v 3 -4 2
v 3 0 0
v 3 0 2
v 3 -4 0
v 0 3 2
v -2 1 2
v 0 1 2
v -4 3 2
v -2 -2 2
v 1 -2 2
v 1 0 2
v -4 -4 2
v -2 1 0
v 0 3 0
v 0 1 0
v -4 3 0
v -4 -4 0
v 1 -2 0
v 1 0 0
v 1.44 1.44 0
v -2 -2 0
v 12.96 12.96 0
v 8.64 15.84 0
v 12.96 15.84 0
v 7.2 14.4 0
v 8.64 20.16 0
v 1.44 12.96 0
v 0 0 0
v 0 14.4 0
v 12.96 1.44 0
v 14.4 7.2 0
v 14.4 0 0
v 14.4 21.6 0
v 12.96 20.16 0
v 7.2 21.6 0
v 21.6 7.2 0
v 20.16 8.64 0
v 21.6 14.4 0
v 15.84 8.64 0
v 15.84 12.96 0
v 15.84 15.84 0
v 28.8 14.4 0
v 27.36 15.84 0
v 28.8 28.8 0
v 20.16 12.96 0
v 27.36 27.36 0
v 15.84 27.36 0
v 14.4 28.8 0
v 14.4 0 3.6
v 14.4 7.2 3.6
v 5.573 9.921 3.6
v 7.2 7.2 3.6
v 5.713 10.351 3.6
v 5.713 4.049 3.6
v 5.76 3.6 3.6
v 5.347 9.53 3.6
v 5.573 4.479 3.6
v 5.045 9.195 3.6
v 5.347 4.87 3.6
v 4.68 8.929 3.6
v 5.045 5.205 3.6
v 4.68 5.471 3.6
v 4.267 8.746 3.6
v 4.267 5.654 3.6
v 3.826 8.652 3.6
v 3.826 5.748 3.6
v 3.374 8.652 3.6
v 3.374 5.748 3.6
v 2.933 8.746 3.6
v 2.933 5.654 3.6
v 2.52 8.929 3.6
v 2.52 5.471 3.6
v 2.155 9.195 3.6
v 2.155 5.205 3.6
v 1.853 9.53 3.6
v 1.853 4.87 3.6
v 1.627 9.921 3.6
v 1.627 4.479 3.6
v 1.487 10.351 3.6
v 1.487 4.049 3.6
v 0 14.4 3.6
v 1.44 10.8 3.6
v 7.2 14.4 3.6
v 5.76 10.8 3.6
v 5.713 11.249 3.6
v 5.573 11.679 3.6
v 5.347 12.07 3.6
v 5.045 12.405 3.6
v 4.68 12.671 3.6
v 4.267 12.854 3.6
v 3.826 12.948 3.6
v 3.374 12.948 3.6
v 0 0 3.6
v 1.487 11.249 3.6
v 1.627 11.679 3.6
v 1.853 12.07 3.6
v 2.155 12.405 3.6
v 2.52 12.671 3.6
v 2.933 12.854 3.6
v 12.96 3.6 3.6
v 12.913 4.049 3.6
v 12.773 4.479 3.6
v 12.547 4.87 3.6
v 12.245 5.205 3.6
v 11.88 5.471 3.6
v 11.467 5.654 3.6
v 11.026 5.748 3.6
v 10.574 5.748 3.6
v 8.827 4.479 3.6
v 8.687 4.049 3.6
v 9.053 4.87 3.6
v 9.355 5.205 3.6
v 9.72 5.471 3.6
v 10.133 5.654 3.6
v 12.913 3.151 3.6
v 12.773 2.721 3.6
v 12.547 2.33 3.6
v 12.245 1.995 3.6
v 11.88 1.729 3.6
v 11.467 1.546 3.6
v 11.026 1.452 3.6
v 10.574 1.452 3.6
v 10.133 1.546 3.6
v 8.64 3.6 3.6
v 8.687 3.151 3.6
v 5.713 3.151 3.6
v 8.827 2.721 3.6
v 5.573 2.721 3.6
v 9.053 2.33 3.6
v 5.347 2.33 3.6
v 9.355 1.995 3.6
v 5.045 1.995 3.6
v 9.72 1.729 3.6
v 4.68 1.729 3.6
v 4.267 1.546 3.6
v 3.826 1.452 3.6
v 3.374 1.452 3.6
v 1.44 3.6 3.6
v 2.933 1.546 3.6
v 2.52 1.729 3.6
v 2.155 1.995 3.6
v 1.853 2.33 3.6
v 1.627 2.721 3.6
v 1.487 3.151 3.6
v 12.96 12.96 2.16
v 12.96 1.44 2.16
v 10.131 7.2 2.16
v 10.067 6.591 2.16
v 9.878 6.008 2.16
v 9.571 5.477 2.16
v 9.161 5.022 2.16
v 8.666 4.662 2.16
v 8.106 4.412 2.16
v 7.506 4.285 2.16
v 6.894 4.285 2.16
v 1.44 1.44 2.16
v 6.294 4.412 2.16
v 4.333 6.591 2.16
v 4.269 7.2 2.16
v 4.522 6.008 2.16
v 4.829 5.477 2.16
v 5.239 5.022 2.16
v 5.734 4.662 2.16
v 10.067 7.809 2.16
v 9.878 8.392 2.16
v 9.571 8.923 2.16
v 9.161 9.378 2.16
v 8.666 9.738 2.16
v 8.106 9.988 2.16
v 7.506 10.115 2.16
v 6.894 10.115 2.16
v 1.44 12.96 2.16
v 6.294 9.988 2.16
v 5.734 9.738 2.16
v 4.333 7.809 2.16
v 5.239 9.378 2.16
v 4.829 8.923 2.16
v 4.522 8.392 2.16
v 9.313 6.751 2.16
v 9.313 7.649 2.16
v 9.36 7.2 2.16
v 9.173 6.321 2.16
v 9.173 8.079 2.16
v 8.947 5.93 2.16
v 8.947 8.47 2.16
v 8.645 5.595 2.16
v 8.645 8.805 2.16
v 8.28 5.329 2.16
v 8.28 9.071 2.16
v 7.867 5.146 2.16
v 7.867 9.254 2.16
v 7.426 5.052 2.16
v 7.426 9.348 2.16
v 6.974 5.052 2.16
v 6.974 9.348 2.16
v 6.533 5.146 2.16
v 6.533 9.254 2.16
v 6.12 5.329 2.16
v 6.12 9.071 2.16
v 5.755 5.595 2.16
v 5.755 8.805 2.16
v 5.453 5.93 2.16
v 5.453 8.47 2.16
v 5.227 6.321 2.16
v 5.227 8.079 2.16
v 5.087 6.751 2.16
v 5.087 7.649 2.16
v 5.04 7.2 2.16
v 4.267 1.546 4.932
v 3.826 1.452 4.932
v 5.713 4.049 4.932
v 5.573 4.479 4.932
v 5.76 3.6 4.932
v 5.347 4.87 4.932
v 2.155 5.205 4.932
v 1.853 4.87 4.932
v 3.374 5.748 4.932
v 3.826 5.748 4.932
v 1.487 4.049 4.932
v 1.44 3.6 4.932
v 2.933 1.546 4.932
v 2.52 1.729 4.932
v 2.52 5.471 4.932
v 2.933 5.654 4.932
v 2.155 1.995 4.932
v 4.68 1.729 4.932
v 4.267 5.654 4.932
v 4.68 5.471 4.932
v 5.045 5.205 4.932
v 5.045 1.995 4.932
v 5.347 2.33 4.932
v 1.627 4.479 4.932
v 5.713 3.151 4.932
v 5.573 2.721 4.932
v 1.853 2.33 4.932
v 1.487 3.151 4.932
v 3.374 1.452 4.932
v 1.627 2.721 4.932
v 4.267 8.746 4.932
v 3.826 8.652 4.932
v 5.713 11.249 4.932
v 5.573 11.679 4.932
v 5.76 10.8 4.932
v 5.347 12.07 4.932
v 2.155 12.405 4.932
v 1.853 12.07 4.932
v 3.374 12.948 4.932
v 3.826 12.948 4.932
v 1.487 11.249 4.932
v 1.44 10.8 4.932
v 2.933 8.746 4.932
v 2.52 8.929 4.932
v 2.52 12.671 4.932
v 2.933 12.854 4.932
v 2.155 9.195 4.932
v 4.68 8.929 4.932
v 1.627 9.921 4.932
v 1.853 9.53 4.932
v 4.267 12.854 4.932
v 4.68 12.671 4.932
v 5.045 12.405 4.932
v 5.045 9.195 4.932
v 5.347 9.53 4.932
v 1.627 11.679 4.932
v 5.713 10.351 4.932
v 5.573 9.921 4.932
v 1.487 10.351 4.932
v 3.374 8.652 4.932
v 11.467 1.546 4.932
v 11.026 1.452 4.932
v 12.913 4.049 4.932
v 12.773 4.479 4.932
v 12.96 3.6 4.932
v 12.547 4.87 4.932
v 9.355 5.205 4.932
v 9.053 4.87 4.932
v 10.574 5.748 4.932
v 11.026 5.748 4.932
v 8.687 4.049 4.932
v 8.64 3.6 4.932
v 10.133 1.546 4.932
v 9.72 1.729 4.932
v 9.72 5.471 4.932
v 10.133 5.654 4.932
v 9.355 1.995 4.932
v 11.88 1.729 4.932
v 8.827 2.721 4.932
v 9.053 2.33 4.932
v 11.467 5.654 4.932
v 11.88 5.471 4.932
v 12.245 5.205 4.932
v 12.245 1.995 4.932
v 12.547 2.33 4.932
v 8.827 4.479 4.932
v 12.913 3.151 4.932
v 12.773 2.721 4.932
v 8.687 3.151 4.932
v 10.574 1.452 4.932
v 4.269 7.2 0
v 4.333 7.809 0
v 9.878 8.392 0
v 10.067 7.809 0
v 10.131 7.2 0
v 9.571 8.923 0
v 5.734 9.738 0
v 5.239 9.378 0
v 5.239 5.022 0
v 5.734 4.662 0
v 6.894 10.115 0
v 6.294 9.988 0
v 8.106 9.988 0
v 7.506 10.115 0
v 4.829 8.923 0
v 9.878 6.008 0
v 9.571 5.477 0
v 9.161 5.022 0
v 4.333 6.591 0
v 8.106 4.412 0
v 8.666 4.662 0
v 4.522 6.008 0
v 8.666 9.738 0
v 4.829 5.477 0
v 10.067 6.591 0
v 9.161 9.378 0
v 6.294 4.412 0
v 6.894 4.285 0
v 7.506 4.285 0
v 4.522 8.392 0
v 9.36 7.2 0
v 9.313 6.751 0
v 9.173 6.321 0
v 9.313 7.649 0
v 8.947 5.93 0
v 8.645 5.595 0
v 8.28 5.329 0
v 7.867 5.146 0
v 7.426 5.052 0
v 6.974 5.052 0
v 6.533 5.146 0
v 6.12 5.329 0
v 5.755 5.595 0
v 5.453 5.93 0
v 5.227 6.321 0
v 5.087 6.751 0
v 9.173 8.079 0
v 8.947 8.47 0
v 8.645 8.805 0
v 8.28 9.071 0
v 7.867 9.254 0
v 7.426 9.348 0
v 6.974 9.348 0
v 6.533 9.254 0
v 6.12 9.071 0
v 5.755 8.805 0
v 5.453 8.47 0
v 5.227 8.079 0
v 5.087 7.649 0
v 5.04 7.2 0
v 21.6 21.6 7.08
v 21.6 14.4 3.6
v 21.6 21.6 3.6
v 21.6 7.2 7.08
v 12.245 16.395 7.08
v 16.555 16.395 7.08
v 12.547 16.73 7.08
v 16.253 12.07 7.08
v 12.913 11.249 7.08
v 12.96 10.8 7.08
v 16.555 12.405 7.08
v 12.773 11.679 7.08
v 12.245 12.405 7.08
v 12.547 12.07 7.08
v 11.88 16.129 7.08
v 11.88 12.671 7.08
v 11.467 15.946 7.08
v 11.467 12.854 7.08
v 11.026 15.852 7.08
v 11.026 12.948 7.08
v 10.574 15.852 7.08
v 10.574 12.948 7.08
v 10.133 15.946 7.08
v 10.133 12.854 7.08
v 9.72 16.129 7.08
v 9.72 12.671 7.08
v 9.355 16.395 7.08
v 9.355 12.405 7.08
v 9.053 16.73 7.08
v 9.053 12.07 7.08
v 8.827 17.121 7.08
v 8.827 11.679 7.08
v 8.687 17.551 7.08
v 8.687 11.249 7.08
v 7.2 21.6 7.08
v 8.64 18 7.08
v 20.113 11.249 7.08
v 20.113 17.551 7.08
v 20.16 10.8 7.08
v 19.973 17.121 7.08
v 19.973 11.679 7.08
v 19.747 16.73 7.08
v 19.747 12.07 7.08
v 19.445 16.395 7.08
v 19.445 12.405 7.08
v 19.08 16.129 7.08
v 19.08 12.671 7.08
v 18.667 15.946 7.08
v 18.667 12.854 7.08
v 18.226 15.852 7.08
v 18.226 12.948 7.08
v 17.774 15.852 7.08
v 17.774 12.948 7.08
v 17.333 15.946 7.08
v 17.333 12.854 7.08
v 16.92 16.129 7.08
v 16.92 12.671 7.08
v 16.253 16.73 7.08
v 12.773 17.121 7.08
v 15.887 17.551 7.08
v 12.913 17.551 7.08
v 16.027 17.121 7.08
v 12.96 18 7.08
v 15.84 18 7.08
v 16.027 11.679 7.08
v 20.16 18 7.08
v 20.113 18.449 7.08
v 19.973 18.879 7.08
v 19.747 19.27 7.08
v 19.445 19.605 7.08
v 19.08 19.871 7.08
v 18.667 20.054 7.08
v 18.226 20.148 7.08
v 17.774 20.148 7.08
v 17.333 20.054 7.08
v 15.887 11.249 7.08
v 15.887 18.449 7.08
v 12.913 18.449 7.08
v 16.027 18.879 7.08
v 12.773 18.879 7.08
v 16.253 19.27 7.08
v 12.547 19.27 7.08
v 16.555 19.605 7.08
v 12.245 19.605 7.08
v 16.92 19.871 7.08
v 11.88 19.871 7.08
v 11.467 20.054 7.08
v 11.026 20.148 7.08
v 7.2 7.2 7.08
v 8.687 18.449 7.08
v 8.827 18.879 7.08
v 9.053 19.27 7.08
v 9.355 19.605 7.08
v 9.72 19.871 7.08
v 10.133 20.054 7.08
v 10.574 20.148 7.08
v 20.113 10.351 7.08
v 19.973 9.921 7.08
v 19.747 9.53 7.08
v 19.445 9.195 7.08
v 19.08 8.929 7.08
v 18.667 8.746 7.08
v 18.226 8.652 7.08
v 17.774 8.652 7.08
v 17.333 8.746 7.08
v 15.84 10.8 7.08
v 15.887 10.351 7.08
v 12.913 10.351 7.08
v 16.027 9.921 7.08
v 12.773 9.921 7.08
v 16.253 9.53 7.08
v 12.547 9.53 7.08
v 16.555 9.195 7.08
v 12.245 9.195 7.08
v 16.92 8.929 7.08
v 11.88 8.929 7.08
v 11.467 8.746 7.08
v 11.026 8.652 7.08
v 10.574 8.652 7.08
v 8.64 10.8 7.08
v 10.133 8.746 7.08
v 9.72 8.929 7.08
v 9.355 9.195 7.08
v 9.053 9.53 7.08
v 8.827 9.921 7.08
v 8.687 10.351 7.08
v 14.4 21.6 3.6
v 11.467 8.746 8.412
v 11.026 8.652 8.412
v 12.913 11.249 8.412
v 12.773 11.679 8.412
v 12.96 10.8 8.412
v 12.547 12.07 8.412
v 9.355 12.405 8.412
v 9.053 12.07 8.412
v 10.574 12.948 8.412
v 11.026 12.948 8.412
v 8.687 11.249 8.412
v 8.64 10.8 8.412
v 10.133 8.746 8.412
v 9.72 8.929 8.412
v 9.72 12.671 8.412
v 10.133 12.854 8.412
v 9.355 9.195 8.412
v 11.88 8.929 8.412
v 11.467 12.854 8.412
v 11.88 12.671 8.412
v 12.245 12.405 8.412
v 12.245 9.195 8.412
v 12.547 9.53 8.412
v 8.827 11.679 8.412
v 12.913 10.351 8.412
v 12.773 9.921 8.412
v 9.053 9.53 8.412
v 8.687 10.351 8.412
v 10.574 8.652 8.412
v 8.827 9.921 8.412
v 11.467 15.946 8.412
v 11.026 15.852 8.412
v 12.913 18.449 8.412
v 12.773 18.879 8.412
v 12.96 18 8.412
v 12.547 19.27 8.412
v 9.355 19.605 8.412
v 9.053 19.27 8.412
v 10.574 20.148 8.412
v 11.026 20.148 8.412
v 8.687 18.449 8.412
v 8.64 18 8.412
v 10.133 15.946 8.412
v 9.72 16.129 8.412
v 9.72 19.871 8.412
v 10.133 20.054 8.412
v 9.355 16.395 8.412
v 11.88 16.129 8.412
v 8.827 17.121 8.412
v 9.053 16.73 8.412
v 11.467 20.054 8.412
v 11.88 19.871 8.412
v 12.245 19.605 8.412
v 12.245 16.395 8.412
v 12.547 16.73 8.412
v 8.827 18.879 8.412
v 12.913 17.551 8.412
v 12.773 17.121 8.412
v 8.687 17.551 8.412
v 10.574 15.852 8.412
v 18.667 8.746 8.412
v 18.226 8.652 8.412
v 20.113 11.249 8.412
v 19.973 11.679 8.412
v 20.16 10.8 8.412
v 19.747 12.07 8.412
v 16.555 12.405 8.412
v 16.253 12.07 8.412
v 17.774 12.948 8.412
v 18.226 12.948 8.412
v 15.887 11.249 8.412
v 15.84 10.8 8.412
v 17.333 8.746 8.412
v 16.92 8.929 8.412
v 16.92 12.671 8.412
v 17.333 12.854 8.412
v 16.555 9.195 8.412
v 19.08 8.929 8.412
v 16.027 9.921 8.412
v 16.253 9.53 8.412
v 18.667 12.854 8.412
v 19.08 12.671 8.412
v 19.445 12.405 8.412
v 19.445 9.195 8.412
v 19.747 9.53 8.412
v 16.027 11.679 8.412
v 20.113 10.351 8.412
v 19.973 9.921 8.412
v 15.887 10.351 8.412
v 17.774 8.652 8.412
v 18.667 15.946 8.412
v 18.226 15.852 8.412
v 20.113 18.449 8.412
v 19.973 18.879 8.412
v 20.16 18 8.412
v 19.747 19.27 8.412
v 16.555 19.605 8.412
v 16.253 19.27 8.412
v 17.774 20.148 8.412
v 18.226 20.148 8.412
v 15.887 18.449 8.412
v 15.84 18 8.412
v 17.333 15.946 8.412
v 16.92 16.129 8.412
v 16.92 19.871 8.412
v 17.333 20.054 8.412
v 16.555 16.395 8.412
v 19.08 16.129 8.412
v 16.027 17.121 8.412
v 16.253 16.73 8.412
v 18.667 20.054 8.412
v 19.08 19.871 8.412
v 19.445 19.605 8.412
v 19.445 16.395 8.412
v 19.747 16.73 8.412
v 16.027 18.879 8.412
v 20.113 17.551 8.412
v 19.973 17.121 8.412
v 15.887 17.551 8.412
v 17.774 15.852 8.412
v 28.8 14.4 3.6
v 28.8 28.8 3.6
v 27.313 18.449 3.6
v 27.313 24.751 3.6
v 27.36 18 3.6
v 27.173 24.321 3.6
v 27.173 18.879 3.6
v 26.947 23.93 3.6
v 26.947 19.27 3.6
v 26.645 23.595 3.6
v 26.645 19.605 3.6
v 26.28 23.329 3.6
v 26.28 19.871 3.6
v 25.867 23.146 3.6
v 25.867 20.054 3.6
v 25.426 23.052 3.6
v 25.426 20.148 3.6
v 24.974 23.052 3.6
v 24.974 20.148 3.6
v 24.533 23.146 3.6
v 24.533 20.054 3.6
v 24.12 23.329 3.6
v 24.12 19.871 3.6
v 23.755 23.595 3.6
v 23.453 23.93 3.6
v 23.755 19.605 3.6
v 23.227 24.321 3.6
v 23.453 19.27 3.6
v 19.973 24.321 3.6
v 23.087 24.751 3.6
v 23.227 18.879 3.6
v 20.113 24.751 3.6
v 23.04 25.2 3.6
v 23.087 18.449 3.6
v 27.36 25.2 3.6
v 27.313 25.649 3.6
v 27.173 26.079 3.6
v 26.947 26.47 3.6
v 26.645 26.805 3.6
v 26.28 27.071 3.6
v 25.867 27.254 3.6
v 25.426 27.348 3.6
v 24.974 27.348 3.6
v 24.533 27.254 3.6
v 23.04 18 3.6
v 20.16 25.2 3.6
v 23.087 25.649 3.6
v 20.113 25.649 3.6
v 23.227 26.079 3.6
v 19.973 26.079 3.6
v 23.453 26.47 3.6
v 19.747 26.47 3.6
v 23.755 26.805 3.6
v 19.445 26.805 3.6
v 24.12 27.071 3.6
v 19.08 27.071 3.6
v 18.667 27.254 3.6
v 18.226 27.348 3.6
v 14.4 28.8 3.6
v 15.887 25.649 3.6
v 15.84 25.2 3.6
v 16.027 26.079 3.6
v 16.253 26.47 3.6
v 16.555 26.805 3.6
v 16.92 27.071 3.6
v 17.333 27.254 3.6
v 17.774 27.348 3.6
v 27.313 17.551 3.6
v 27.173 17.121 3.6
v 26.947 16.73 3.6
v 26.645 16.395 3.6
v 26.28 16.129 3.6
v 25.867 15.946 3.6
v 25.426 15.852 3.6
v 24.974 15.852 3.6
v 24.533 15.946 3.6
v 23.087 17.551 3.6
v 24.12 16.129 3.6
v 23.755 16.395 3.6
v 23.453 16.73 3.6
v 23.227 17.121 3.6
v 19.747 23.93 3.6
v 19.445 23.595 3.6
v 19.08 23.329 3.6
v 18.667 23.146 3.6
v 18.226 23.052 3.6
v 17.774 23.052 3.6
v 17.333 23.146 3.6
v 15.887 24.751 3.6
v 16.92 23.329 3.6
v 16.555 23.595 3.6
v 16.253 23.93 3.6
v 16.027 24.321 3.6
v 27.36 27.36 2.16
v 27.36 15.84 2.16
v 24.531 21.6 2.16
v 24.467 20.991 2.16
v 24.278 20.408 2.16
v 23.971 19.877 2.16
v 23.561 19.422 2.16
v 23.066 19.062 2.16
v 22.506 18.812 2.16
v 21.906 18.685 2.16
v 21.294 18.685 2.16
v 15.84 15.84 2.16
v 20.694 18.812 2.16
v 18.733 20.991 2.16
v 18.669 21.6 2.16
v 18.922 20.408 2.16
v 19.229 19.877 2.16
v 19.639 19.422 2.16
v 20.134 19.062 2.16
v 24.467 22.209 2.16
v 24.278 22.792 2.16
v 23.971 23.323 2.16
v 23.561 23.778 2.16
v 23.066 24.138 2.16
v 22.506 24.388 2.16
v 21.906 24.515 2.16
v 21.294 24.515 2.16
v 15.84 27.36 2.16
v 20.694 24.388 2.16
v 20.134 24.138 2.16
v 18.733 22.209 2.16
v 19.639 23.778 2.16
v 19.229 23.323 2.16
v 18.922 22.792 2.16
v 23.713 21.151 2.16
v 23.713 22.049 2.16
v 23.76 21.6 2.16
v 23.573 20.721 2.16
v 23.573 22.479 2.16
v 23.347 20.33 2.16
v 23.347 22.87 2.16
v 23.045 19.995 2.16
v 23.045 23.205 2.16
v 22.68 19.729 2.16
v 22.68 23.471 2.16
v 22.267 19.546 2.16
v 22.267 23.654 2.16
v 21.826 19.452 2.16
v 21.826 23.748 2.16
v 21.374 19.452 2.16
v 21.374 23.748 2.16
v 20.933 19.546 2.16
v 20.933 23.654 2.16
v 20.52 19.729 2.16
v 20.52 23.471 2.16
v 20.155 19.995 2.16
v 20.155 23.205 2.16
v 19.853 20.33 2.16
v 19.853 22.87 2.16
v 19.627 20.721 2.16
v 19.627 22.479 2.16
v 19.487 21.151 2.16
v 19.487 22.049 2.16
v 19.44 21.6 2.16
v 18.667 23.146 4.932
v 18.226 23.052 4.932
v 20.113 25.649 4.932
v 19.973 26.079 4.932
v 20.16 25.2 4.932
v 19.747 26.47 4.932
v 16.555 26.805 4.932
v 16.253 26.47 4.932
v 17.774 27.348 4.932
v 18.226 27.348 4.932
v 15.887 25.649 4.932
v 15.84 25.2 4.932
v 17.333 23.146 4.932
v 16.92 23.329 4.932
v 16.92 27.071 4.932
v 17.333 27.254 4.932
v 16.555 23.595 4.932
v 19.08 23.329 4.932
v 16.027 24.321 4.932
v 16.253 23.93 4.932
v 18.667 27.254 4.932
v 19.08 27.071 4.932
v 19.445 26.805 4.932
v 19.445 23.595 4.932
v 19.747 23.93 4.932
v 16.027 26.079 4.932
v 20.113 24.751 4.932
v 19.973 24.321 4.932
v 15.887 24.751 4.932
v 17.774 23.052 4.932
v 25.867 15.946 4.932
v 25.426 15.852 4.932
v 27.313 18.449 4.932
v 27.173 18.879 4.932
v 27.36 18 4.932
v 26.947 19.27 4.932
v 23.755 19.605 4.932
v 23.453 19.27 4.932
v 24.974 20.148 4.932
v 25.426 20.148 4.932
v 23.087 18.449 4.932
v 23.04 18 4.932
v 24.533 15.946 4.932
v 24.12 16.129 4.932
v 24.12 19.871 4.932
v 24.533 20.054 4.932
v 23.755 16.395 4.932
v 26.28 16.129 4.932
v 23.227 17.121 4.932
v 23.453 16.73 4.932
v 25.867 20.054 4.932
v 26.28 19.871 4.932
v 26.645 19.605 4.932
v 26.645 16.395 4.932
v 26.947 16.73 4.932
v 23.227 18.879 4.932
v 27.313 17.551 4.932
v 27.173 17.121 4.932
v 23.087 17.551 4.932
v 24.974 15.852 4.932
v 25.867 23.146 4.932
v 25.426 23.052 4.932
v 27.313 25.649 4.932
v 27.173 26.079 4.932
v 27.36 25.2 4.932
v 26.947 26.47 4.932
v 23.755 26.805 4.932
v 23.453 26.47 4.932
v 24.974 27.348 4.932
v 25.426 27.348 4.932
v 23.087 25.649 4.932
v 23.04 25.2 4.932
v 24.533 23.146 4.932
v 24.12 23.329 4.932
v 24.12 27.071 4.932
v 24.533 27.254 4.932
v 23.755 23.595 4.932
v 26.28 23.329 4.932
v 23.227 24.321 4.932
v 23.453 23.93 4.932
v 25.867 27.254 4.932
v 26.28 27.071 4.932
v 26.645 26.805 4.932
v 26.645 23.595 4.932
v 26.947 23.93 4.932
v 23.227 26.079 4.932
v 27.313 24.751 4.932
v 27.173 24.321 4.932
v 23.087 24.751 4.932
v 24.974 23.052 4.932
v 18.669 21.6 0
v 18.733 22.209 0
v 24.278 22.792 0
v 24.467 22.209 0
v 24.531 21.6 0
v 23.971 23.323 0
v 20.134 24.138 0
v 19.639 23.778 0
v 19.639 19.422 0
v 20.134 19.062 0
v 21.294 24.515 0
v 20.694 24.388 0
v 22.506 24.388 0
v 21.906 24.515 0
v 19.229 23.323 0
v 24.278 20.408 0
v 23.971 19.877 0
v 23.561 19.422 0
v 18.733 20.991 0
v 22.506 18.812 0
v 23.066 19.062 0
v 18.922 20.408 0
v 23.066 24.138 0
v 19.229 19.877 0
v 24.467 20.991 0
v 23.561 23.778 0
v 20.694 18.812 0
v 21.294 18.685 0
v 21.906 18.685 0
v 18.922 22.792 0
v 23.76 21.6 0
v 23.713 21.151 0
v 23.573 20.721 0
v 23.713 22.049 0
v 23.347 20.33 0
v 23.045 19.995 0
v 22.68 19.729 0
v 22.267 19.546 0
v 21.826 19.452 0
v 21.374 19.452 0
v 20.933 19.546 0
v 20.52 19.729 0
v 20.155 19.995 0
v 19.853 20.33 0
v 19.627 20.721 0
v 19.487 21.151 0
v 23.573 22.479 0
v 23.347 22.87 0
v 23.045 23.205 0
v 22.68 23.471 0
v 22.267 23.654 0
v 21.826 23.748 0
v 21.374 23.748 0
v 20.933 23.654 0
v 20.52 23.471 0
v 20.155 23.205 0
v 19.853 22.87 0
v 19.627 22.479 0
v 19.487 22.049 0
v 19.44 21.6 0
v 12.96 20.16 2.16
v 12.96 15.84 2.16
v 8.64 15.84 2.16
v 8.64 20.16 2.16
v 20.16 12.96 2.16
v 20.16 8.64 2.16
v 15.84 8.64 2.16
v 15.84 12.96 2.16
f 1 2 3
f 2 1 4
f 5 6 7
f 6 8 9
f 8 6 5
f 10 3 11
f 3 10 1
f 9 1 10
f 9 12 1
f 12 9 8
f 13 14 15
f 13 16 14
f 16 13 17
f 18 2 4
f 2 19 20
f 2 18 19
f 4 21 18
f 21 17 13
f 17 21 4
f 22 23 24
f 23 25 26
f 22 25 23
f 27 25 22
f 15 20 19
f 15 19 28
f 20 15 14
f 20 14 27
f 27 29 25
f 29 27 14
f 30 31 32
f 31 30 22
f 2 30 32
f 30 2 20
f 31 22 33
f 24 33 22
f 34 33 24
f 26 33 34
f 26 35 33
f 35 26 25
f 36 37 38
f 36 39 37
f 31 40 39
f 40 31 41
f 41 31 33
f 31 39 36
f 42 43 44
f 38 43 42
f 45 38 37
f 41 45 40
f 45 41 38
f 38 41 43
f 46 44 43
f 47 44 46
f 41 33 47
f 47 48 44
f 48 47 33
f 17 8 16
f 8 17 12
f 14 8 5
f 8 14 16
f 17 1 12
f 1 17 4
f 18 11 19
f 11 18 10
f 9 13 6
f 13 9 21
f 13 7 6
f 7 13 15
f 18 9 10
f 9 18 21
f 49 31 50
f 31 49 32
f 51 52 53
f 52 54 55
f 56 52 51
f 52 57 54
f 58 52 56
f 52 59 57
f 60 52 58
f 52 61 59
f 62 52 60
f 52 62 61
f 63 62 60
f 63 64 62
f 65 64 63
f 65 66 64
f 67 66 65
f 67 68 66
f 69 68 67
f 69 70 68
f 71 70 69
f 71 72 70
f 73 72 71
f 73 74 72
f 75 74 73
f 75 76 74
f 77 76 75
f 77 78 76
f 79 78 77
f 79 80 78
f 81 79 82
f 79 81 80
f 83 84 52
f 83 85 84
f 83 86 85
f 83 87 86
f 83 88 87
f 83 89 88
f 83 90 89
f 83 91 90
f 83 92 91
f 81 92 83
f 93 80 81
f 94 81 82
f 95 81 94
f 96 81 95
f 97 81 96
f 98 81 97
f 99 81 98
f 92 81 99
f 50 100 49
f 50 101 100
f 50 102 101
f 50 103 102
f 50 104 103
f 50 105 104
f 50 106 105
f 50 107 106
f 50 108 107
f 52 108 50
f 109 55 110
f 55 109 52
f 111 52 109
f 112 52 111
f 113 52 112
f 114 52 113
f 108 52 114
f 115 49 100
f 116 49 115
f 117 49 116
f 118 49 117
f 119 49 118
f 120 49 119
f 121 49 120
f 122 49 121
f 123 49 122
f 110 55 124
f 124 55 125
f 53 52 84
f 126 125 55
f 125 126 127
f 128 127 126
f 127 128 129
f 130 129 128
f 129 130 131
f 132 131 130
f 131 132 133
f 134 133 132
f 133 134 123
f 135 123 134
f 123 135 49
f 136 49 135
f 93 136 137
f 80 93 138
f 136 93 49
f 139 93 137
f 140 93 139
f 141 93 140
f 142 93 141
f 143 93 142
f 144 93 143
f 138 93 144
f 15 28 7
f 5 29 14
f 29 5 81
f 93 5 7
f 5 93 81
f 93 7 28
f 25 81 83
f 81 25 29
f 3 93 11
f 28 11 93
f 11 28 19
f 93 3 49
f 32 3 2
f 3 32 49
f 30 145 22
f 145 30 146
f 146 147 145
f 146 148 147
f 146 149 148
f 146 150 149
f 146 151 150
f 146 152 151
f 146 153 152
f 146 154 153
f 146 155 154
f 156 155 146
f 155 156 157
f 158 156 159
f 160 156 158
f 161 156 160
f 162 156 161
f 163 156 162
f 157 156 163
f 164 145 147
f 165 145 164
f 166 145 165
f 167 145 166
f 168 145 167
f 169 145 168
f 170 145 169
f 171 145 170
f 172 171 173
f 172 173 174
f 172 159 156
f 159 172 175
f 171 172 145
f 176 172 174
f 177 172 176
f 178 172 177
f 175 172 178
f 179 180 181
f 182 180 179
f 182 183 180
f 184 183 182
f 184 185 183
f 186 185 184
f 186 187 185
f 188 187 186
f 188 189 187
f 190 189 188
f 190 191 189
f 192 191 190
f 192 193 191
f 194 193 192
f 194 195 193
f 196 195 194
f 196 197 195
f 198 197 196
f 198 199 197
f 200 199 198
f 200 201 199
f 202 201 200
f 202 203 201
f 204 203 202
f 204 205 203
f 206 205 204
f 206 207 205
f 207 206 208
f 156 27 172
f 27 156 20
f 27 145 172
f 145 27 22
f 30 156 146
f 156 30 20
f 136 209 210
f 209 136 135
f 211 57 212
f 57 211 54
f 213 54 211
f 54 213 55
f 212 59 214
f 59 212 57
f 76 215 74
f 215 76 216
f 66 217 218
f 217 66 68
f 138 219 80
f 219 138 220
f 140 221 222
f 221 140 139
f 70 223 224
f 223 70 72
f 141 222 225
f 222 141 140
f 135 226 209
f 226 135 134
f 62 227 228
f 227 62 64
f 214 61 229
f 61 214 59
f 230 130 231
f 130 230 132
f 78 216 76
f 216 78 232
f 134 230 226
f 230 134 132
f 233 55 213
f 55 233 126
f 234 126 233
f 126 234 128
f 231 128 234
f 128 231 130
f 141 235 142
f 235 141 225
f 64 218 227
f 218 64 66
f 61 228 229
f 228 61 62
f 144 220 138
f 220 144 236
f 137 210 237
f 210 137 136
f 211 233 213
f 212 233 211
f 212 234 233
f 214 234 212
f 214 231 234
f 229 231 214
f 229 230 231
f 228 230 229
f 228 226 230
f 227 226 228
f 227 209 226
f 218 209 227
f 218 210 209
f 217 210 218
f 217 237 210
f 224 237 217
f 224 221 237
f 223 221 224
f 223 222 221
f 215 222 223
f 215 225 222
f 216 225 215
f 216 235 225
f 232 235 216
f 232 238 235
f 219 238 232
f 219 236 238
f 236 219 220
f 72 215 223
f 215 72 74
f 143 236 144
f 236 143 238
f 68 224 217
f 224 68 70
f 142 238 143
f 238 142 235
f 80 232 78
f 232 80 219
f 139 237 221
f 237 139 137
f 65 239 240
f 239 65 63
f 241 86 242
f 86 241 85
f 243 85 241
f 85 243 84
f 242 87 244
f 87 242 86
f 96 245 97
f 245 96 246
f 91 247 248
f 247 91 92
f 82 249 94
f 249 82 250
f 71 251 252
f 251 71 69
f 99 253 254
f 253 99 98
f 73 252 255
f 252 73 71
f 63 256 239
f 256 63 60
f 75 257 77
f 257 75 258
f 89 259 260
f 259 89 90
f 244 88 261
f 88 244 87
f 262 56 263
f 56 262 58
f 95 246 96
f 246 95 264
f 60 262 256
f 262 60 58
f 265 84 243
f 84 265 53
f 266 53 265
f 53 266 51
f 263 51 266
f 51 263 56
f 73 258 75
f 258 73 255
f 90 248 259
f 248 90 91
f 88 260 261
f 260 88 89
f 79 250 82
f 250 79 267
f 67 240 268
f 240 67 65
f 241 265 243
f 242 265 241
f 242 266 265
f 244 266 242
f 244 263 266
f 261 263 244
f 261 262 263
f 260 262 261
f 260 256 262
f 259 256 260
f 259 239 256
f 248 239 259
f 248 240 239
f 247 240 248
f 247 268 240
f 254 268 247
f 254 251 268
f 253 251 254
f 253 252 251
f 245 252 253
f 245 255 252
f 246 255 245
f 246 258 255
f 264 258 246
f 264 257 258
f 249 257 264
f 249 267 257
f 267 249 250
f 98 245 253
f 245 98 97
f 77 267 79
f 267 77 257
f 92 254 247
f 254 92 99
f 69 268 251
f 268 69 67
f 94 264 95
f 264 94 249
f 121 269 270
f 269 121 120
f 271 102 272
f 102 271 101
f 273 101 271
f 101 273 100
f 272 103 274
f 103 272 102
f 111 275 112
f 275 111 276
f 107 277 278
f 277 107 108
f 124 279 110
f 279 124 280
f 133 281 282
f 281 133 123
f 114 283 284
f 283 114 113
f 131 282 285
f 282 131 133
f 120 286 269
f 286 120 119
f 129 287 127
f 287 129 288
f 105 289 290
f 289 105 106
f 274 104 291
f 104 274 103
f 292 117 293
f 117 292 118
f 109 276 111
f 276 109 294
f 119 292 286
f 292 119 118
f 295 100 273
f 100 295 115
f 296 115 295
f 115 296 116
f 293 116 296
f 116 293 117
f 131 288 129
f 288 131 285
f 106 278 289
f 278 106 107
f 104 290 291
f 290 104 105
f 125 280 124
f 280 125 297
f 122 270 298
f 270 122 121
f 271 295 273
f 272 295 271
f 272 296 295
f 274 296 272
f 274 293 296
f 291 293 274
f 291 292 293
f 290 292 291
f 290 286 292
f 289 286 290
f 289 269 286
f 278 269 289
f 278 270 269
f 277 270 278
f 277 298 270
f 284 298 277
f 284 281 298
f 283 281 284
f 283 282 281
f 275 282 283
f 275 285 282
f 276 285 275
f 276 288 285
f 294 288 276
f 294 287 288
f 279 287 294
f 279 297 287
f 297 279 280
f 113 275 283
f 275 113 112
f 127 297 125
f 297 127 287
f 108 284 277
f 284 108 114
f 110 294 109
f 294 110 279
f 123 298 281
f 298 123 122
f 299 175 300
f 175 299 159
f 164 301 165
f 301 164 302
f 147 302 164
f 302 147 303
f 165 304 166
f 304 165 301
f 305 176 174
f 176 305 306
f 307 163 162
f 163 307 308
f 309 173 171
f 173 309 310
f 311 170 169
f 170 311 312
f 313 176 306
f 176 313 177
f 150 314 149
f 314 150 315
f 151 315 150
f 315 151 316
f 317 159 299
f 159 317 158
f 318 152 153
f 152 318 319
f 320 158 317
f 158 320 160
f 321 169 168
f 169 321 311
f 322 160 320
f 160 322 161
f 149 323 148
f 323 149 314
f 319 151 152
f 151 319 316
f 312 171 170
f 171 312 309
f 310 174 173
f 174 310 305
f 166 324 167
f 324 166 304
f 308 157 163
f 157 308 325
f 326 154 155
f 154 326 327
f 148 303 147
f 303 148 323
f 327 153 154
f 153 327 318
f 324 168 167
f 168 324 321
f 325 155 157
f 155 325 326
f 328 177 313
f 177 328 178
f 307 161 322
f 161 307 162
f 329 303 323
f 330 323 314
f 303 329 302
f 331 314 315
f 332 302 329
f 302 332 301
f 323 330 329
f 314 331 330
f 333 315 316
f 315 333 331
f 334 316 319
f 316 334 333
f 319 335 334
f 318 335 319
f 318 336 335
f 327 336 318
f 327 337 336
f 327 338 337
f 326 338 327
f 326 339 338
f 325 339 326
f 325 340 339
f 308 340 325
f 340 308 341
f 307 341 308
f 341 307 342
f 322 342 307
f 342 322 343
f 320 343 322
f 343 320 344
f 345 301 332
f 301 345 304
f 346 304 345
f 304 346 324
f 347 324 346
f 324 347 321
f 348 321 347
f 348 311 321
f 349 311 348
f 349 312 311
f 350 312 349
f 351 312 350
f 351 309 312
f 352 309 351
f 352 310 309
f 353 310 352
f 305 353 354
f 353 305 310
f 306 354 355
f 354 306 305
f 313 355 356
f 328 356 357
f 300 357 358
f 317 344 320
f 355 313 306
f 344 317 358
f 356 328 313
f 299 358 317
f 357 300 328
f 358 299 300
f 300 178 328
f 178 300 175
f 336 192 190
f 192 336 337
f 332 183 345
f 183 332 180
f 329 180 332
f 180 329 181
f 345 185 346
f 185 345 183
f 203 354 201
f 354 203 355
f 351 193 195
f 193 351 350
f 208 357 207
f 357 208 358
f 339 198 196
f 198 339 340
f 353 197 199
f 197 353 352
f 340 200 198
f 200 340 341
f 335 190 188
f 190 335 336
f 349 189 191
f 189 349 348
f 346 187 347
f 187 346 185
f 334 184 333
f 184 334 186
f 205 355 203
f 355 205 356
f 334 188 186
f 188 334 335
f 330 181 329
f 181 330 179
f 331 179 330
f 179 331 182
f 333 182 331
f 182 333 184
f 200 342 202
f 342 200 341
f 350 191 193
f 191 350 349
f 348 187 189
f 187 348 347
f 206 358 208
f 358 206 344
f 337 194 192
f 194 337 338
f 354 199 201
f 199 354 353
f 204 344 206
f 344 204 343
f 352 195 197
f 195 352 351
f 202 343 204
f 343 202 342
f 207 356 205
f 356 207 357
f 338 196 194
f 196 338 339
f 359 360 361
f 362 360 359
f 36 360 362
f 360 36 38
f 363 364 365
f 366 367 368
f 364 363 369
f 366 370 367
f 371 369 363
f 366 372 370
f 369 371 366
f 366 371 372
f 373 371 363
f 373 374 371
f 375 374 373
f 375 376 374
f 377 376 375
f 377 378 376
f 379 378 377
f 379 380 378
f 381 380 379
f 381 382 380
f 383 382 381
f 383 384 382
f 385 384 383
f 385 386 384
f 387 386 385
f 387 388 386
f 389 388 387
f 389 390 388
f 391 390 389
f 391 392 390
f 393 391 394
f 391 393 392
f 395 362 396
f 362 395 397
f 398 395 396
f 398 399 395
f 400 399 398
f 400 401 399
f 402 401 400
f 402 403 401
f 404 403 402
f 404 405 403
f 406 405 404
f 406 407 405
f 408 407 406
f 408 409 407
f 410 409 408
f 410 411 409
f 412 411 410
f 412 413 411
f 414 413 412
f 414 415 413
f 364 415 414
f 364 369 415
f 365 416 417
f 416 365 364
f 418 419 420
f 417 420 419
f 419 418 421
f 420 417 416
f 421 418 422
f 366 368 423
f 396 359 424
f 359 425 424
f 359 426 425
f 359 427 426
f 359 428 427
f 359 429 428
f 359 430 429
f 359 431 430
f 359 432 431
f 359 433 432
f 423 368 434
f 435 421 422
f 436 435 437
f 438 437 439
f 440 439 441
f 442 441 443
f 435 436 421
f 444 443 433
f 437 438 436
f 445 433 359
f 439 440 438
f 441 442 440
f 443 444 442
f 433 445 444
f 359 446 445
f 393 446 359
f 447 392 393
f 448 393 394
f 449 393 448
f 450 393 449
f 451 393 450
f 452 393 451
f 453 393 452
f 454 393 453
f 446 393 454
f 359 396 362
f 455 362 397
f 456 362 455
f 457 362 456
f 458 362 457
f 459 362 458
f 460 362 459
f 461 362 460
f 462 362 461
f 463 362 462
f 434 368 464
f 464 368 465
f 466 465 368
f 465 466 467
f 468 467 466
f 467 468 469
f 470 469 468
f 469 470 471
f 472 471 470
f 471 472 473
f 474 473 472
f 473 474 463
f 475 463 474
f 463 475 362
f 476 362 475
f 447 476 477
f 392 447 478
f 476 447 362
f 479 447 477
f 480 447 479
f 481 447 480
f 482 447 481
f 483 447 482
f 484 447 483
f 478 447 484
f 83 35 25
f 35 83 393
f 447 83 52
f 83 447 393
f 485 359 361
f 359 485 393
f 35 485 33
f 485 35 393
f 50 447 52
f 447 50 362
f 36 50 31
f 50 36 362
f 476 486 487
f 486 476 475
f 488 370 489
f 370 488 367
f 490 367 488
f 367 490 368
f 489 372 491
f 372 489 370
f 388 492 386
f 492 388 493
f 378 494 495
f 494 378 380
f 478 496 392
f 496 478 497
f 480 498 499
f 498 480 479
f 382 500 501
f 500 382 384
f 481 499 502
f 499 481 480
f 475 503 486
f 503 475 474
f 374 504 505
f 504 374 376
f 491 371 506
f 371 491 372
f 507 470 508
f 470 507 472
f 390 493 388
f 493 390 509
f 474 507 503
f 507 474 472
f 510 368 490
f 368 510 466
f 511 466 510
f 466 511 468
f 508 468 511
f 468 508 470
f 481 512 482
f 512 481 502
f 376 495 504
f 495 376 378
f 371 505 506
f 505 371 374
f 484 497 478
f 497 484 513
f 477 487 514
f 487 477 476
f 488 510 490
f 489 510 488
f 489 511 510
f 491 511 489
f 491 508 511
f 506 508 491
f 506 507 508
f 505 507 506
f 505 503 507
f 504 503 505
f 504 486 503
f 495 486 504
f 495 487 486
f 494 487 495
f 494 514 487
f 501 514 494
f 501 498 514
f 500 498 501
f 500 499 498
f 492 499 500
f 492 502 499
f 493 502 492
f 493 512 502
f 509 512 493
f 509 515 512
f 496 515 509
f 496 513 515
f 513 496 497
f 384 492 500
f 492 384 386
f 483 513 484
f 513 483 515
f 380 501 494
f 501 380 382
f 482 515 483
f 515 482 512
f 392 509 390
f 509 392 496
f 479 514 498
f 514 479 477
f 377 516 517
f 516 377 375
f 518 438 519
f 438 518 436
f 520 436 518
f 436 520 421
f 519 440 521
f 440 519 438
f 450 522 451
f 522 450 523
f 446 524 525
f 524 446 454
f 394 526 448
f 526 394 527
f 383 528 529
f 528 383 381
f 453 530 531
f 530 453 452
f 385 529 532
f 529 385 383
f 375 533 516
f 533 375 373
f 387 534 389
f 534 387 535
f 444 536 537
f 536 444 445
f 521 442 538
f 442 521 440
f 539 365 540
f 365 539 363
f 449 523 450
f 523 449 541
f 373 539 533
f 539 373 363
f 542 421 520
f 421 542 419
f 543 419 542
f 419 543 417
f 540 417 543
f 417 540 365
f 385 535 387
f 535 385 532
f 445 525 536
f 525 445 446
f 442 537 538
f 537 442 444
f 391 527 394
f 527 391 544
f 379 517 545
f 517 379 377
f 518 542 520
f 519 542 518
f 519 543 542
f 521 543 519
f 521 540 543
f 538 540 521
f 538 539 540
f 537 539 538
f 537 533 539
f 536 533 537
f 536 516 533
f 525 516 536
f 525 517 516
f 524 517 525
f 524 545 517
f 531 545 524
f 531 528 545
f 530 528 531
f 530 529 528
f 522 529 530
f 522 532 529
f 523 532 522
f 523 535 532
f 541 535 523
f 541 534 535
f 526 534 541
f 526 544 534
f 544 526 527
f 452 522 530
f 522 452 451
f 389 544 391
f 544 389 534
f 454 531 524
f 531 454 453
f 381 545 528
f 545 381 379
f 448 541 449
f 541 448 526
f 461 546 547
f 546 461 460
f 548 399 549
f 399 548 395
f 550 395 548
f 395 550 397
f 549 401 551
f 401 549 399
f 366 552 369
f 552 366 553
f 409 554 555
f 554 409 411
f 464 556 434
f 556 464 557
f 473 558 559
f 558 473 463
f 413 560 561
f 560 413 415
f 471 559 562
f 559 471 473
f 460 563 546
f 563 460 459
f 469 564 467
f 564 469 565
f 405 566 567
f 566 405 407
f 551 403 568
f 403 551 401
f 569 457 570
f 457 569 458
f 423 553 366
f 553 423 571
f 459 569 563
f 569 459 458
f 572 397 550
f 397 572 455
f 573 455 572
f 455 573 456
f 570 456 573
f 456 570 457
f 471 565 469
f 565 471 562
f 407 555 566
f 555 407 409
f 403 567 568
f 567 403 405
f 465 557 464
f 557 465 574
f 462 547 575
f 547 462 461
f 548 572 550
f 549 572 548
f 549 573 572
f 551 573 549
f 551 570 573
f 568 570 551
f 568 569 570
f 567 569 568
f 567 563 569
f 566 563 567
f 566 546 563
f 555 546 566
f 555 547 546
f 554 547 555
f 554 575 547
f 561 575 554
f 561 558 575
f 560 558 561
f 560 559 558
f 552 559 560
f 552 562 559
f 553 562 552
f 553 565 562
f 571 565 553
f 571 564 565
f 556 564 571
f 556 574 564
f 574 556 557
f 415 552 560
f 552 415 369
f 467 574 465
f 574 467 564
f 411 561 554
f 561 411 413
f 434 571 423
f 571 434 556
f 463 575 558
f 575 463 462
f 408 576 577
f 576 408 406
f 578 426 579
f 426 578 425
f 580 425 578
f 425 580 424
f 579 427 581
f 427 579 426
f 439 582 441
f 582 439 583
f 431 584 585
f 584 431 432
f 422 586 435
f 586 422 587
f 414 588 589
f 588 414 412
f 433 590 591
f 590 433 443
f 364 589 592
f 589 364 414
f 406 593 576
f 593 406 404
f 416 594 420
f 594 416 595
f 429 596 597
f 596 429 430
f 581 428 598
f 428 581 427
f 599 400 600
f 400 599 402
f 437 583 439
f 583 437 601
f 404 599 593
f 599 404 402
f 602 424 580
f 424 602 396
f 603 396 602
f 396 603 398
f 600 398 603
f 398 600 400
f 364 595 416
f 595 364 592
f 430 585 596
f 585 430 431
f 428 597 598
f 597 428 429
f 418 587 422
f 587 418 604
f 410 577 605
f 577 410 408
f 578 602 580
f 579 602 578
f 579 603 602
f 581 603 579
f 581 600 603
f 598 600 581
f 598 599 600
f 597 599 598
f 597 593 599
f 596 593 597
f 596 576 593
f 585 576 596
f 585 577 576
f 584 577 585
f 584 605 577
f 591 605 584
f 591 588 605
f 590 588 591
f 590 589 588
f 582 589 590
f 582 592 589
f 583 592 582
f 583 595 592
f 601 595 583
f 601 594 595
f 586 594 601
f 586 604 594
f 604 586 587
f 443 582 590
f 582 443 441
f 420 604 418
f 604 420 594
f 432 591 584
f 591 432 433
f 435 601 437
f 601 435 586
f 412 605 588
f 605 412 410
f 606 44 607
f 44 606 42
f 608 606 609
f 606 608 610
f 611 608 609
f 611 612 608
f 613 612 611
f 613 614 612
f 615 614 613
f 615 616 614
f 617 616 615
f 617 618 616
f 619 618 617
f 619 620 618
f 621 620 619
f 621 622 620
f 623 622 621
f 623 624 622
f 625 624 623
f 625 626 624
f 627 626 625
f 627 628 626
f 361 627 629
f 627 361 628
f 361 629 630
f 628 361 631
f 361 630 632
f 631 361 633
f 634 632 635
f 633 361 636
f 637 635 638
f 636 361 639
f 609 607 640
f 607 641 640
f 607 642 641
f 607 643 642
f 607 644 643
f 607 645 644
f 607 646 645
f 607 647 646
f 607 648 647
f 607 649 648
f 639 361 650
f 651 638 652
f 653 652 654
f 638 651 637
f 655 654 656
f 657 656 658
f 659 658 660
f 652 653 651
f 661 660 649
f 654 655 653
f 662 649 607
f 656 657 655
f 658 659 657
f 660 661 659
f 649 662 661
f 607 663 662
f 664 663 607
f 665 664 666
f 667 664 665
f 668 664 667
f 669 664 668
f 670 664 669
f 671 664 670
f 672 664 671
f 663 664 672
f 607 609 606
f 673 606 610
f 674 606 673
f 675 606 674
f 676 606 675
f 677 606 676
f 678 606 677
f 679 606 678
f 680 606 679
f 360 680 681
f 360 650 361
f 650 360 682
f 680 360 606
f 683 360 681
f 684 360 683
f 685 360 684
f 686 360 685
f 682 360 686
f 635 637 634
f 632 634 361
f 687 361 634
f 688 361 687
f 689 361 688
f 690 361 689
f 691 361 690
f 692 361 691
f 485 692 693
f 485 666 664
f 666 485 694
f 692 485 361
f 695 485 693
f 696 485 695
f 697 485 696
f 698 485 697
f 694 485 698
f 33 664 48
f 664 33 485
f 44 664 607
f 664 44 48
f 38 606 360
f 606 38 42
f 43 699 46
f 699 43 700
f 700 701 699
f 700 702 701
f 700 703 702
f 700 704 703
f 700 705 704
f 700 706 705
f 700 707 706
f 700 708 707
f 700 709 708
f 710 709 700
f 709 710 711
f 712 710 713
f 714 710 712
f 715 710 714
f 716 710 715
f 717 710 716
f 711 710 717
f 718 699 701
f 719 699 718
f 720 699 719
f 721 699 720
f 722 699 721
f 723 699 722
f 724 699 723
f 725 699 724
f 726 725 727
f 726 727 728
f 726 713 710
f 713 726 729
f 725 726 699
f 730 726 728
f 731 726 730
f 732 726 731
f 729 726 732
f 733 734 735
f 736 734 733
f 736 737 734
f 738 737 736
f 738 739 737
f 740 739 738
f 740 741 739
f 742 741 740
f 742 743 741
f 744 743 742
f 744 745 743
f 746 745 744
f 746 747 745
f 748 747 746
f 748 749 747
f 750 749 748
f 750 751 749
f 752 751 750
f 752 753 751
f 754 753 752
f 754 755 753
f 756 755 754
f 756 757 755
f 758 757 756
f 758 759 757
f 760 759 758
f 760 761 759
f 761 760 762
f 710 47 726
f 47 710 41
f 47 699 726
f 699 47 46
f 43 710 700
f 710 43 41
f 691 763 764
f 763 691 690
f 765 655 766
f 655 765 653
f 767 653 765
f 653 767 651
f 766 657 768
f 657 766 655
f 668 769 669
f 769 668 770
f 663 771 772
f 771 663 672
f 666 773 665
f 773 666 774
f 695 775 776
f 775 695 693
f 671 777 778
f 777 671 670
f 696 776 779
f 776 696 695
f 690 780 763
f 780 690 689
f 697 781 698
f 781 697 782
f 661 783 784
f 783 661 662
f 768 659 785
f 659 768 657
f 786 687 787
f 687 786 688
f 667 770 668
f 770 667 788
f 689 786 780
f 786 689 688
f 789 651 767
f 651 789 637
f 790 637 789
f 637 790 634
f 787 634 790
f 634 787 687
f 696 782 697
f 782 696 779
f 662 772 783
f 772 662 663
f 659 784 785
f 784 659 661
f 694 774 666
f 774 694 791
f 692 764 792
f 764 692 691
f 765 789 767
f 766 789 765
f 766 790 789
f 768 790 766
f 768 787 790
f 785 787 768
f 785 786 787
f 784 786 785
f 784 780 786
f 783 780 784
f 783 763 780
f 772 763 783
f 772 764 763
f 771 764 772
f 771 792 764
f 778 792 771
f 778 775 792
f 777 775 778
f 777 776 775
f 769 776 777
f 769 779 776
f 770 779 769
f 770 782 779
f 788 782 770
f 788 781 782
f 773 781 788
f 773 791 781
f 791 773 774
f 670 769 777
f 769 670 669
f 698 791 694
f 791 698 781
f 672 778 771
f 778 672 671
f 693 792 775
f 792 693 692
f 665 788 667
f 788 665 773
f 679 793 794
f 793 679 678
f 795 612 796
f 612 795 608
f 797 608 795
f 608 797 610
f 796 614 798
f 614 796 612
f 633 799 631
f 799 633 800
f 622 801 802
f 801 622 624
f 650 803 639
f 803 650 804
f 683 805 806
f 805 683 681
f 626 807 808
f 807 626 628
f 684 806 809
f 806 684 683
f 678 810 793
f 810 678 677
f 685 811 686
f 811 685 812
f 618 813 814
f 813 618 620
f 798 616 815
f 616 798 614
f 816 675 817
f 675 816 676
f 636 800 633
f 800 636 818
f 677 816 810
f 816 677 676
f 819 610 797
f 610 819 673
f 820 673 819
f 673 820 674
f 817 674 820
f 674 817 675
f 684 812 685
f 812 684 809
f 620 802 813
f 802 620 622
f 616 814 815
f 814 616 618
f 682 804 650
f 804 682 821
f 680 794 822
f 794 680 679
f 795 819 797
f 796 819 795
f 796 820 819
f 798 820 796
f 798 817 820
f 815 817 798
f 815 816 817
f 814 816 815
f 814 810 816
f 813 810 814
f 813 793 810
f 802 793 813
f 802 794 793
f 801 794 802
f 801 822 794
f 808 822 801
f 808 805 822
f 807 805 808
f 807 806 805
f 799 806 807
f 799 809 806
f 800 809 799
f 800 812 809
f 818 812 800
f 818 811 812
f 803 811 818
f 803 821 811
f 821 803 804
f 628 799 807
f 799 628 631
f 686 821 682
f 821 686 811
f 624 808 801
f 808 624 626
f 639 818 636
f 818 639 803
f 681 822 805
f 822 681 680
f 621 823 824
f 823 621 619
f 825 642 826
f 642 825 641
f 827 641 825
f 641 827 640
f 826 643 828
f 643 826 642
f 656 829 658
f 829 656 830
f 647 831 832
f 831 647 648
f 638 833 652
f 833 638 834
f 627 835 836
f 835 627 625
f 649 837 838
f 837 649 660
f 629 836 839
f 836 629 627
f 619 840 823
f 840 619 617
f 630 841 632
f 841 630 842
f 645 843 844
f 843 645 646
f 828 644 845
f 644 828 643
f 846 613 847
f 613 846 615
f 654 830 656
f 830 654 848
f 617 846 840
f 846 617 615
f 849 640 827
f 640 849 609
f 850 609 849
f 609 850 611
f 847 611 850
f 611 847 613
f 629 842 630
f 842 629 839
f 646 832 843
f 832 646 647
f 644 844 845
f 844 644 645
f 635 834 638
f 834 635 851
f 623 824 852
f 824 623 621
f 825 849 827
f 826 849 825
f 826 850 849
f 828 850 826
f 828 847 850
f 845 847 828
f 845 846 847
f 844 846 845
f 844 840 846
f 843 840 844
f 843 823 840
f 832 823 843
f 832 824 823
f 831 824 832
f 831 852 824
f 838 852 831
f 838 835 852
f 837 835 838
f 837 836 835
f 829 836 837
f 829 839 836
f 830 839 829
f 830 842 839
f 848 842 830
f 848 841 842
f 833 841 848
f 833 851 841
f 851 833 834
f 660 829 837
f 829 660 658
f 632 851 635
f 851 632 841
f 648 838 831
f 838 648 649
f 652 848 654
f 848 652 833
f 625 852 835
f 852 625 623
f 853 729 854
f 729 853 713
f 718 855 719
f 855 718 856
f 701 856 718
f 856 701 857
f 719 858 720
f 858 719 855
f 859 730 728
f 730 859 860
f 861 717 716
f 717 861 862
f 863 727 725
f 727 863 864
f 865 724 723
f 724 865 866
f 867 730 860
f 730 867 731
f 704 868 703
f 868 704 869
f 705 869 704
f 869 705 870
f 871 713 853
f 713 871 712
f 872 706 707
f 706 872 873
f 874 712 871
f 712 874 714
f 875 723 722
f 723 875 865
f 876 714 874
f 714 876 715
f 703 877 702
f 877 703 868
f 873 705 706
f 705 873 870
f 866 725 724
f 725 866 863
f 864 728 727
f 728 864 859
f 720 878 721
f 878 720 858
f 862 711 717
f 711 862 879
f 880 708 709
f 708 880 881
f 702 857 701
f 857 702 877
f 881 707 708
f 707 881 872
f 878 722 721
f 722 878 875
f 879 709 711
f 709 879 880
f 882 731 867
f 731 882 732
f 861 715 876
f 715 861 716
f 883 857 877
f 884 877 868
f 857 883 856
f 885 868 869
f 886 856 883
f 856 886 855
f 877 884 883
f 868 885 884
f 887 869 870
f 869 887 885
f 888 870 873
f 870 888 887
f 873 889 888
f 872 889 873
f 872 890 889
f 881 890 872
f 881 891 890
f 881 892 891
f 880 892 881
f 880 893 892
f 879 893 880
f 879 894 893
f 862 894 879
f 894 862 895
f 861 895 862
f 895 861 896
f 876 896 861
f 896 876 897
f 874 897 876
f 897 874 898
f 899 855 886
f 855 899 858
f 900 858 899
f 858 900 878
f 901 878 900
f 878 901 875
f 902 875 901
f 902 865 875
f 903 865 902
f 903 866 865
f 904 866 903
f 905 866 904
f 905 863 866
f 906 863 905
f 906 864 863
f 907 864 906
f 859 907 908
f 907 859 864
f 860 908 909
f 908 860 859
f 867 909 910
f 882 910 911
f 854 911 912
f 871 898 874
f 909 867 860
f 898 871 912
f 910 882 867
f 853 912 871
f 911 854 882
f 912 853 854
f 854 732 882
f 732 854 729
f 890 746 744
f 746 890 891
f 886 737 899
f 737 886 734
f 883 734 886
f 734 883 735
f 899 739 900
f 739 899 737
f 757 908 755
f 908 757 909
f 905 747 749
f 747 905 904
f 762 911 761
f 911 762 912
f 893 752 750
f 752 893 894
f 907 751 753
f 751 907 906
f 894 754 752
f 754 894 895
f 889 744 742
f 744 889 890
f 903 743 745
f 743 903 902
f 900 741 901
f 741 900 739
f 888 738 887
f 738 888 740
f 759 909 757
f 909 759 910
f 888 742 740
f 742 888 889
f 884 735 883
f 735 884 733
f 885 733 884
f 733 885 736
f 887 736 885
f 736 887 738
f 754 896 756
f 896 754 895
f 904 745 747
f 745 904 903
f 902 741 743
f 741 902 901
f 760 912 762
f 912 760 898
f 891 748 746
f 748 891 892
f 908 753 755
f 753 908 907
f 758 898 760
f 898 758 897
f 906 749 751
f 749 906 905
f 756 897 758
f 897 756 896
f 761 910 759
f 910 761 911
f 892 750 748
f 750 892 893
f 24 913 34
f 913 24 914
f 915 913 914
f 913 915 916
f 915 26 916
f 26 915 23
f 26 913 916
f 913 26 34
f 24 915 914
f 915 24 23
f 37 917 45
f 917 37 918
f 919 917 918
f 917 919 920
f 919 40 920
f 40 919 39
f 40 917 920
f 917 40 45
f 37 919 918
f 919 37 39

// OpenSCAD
$fn=30;
lego_unit = 60;
lego_height = lego_unit/2;
lego_button_radius = 18;
lego_wall_width = lego_unit/2 - lego_button_radius;
lego_button_height = 2*lego_wall_width;
base_pin_radius = lego_wall_width;
base_circle_radius = (lego_unit*sqrt(2) - 2*lego_button_radius)/2;

module lego_brick(brick_length=4, brick_width=2){

union(){
	difference(){
		cube([lego_unit*brick_length, lego_unit*brick_width, lego_height]);

		translate([lego_wall_width, lego_wall_width, -lego_wall_width])
		  cube([lego_unit*brick_length - 2*lego_wall_width, lego_unit*brick_width - 2*lego_wall_width, lego_height]);
	}

	//buttons
	for (i = [0:brick_length-1]) {
		for (j = [0:brick_width-1]) {
			translate([lego_unit/2+i*lego_unit, lego_unit/2+j*lego_unit,lego_height+0.1]) cylinder(r=lego_button_radius,h=lego_button_height-2,center=true);
		}
	}

	if (brick_width==1){
		if (brick_length>1){
			//base pins
			for (i = [1:brick_length-1]) {
				translate([i*lego_unit, lego_unit/2, lego_height/2]) cylinder(r=base_pin_radius, h=lego_height, center=true);
			}
		}

		if (brick_length > 3){
			for (i = [1:(brick_length/2-1)]) {
				translate([i*2*lego_unit, lego_unit/2, lego_height/2+lego_wall_width/4]) cube([lego_wall_width, lego_unit,lego_height-lego_wall_width/2], center=true);
			}
		}
	} else {
		difference(){
			union(){
				//body of the base circles
				for (i = [1:brick_length-1]) {
					translate([i*lego_unit, lego_unit, lego_height/2])
					difference(){
						cylinder(r=base_circle_radius, h=lego_height, center=true);
					}
				}

				//inner walls
				if (brick_length > 3){
					for (i = [1:(brick_length/2-1)]) {
						translate([i*2*lego_unit, lego_unit, lego_height/2+lego_wall_width/2]) cube([lego_wall_width/4, 2*lego_unit,lego_height-lego_wall_width], center=true);
					}
				}
			}
			
			//holes of the base circles
			for (i = [1:brick_length-1]) {
				translate([i*lego_unit, lego_unit, lego_height/2])
				cylinder(r=lego_button_radius, h=lego_height+1, center=true);
			}

		}

	}
}

}

if (0){
translate([-1.4, -1.4]){
difference(){
	cylinder(r=4, h=2);
	translate([0, 0, -1]) cylinder(r=2, h=5);
}
}}


translate([-4, -4]){
difference(){
	cube([7, 7, 2]);
	translate([2, 2, -1]) cube([3, 3, 5]);
	translate([4.5, 4.5, -1]) cube([3, 3, 5]);
}
}

difference(){

scale(0.12){
lego_brick(2,2);
translate([lego_unit,lego_unit,lego_unit/2 -1]){
	lego_brick(2,2);
	cube([lego_unit*2,lego_unit*2,lego_unit/2]);
}
translate([lego_unit*2,lego_unit*2]) lego_brick(2,2);
translate([lego_unit,lego_unit*2]) lego_brick(1,1);
translate([lego_unit*2,lego_unit]) lego_brick(1,1);
}
//	translate([1, 1, -1]) cylinder(r=2, h=10);
}
